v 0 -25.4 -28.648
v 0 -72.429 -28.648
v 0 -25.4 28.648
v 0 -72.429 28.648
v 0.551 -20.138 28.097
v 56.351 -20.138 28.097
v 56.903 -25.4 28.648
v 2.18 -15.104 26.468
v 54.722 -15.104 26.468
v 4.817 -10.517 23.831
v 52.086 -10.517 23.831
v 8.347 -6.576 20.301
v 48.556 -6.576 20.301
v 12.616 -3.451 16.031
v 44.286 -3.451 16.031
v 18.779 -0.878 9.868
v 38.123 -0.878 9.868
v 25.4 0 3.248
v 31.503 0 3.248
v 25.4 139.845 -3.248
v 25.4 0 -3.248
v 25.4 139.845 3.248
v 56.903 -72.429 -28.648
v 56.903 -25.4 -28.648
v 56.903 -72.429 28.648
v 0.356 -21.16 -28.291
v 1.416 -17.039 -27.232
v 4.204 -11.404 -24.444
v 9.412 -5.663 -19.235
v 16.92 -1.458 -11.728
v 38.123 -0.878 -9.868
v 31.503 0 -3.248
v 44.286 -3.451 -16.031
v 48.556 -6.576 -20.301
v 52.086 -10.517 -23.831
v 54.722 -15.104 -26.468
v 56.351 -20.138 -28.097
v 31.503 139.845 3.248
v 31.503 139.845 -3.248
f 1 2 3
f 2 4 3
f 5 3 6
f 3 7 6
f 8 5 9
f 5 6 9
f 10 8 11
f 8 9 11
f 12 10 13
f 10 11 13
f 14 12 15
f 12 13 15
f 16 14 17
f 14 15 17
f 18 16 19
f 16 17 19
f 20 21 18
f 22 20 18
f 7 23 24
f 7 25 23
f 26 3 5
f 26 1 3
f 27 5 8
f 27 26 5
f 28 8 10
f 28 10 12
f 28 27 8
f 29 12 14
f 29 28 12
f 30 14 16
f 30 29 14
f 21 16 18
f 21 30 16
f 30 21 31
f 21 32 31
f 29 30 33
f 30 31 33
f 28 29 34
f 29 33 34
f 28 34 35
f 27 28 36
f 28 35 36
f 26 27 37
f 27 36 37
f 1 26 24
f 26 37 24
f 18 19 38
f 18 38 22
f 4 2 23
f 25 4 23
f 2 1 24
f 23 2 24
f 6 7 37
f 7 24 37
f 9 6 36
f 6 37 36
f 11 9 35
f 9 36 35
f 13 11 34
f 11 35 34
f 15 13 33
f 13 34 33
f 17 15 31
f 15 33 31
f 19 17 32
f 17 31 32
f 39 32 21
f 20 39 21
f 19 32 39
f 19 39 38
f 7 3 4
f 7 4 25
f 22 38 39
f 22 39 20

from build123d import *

# Parameters (mm, degrees)
F0_W      = 56.902528
F0_H      = 72.428972
F1_DEPTH  = 28.647777
F2_R      = 25.4
F1_FACE_W = 6.102528
F1_FACE_H = 6.495554
F3_DEPTH  = 139.845217


with BuildPart() as f1:
    # F0 (on Top) → F1 (new body, symmetric)
    with BuildSketch(Plane.XY):
        with Locations((28.451264, -36.214486)):
            Rectangle(F0_W, F0_H)
    extrude(amount=F1_DEPTH, both=True)

    # F2
    f2_edges = [f1.edges().sort_by_distance(p)[0] for p in [
        (56.902528, 0, 0),
        (28.451264, 0, -28.647777),
        (0, 0, 0),
        (28.451264, 0, 28.647777),
    ]]
    fillet(f2_edges, radius=F2_R)

    # F1_face (on face) → F3 (join)
    with BuildSketch(Plane(origin=(28.451264, 0, 0), x_dir=(-1, 0, 0), z_dir=(0, 1, 0))):
        Rectangle(F1_FACE_W, F1_FACE_H)
    extrude(amount=F3_DEPTH)


solid = f1.part
